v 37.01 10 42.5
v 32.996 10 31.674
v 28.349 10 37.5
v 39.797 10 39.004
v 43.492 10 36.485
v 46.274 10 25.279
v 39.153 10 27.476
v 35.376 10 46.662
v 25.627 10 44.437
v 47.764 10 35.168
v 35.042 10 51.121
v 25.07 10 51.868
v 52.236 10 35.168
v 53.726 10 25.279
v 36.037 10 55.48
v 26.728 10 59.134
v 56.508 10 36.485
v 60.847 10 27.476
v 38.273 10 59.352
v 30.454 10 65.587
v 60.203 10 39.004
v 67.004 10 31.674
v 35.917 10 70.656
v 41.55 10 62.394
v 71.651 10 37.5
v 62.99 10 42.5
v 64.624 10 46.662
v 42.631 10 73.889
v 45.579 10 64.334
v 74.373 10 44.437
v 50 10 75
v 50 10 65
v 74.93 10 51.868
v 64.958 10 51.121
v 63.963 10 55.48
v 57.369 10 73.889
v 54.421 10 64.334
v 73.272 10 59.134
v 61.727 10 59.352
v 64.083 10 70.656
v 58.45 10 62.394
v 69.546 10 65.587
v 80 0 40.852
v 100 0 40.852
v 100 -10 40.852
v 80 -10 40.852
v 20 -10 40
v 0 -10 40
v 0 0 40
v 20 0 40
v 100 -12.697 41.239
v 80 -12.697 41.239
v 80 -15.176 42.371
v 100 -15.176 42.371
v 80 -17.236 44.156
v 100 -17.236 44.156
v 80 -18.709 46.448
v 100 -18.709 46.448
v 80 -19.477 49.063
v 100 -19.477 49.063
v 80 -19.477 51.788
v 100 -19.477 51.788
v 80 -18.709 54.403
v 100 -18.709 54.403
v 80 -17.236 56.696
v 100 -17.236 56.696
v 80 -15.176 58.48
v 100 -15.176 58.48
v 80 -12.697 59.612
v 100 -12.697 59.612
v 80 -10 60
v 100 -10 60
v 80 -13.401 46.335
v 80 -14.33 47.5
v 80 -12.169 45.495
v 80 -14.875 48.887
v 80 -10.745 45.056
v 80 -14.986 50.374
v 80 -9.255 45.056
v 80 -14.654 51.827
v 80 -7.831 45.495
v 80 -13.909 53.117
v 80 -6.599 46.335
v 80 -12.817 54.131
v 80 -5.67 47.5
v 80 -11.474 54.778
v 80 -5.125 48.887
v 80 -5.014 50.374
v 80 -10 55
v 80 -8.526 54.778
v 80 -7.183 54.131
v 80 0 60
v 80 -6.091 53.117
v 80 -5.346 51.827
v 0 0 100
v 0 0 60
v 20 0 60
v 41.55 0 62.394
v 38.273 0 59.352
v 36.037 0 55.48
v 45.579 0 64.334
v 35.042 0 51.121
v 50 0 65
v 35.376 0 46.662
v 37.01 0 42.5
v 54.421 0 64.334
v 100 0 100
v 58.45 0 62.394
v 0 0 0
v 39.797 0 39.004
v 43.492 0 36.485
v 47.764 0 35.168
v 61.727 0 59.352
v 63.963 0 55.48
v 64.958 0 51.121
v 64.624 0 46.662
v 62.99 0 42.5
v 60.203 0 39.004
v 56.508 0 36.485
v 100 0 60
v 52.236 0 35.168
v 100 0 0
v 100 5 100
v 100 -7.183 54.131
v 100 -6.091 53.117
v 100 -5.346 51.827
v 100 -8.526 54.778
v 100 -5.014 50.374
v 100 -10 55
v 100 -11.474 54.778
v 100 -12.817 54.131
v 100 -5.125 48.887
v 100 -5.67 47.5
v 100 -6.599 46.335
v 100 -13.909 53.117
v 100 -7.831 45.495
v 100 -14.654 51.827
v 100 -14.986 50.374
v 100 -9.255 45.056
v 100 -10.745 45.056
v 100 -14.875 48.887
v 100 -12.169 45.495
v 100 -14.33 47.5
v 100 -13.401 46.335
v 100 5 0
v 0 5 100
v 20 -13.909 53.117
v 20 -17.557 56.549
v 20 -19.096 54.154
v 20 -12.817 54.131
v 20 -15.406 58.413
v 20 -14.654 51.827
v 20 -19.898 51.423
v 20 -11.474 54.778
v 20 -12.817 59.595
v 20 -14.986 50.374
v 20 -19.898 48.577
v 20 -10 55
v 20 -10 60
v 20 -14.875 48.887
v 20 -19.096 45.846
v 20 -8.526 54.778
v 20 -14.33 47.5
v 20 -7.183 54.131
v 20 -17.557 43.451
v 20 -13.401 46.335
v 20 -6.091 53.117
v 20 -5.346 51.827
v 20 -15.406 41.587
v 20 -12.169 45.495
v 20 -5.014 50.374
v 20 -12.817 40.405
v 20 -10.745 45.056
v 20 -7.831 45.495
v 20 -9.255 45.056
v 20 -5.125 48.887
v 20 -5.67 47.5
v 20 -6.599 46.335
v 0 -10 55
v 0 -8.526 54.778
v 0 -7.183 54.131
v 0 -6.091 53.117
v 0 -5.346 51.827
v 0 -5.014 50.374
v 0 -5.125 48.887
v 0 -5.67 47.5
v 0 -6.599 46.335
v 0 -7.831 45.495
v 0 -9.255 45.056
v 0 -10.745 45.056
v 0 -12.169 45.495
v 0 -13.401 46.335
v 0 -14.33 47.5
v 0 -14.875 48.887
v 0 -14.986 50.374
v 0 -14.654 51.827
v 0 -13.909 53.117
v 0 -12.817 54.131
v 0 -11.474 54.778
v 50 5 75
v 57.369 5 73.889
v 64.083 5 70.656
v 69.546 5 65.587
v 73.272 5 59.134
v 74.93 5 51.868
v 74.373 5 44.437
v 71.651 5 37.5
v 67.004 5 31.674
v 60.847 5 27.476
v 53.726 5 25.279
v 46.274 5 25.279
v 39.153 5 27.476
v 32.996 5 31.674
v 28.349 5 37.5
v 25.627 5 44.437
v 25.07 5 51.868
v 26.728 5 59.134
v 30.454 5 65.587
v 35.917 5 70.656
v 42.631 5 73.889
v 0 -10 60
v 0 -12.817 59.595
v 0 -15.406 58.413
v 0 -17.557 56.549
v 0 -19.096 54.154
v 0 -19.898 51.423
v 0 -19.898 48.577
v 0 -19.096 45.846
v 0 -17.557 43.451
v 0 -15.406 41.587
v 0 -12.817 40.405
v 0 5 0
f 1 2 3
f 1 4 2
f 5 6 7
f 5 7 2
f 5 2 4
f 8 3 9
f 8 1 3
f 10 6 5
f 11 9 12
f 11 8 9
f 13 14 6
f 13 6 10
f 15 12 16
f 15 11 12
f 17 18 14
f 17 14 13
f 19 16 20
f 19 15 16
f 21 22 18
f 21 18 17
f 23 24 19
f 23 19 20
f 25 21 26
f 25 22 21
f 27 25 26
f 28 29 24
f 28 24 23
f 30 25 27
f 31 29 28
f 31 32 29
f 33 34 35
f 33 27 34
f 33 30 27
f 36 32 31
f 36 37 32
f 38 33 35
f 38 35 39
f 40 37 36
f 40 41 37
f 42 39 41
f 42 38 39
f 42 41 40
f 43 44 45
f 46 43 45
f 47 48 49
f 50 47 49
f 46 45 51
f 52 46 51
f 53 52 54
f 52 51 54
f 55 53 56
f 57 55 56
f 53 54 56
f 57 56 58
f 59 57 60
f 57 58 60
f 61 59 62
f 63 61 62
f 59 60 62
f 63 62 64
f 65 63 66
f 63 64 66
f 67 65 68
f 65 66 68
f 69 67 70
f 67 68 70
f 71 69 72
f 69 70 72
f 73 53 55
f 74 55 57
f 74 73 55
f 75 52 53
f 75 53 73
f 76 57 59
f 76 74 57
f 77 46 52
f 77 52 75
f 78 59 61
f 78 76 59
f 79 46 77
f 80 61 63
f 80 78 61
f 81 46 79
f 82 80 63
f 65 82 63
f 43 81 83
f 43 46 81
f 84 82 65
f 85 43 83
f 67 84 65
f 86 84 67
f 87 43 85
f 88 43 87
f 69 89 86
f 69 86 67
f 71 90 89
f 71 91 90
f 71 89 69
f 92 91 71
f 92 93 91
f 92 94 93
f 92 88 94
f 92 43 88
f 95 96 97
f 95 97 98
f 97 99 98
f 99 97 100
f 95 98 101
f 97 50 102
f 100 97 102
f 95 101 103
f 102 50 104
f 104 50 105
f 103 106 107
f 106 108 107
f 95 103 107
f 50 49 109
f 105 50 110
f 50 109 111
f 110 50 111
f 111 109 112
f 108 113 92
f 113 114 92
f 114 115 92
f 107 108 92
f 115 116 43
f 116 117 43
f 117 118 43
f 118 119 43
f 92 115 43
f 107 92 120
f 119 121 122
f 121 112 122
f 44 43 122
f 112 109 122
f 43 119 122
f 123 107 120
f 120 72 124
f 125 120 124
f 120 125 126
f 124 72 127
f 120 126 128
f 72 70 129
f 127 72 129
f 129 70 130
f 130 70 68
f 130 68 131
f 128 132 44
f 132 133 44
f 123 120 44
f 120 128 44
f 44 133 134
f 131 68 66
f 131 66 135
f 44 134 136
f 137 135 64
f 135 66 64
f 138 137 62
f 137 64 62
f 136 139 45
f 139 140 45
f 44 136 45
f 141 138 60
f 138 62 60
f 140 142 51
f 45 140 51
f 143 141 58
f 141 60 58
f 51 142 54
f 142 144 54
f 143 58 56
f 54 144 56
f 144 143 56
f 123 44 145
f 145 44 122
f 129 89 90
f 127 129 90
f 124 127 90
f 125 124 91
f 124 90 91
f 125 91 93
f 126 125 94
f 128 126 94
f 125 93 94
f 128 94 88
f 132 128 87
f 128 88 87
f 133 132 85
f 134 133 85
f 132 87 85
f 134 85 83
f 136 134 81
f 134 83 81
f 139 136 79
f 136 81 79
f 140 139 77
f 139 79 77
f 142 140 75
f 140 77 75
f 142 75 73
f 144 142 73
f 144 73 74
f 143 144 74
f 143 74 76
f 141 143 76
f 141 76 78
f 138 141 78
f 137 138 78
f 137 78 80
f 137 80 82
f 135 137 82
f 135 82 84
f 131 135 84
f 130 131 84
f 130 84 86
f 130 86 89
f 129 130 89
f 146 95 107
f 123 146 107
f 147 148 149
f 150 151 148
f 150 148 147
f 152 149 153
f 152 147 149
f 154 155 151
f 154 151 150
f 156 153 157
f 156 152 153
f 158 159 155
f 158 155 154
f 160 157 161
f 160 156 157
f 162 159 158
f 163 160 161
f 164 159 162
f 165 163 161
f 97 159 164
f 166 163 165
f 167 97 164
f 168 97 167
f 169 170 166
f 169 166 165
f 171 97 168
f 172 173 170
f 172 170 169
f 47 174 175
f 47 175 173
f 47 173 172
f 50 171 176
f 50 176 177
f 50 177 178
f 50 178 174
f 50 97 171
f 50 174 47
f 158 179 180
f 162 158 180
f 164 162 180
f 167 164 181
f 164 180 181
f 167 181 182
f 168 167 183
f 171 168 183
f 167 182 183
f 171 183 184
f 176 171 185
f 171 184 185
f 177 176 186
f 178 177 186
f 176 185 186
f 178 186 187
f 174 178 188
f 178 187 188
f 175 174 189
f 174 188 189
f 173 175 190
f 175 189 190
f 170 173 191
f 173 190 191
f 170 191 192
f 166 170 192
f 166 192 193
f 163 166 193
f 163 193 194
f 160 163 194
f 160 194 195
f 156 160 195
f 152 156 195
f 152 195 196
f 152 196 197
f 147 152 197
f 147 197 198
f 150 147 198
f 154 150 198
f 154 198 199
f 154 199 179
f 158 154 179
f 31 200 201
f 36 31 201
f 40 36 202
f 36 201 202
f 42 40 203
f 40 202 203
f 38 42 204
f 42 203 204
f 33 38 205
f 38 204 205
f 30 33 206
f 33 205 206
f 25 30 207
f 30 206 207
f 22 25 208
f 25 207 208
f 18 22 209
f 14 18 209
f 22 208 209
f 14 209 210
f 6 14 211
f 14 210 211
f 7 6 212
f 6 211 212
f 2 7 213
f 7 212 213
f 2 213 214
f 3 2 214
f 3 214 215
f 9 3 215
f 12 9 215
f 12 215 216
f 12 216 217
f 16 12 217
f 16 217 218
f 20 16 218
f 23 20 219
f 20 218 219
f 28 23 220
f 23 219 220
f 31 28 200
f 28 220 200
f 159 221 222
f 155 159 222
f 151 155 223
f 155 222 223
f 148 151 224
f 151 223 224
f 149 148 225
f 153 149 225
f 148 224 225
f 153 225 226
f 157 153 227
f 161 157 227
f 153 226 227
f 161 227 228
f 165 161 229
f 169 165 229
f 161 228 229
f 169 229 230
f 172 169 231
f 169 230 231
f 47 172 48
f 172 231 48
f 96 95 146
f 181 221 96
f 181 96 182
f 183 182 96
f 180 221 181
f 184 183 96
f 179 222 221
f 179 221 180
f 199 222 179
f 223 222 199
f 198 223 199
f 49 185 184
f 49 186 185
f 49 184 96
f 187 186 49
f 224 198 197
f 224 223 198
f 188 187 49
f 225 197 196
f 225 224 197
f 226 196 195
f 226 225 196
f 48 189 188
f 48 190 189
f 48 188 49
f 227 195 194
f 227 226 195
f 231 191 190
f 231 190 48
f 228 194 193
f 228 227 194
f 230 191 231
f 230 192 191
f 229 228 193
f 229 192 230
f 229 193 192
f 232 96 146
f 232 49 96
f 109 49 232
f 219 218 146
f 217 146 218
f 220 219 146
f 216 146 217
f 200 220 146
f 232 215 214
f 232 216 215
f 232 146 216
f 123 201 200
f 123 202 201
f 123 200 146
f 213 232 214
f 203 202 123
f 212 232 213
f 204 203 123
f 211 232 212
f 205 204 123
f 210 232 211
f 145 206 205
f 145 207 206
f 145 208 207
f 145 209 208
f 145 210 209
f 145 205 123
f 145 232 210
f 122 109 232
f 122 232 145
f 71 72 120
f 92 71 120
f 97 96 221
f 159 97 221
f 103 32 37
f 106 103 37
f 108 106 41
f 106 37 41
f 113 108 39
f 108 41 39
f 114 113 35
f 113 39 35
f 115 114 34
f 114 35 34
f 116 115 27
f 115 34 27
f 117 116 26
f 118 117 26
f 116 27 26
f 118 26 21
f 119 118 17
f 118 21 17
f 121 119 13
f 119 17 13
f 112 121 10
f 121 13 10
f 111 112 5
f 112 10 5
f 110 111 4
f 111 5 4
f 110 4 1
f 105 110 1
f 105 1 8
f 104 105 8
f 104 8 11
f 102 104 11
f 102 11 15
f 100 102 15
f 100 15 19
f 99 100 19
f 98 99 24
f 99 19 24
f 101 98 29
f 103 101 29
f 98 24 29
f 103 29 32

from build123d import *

# Parameters (mm, degrees)
SKETCH_1_W          = 100
SKETCH_1_H          = 100
EXTRUDE_1_DEPTH     = 5
SKETCH_2_R          = 25
EXTRUDE_2_DEPTH     = 5
SKETCH_3_R          = 15
CUT_EXTRUDE_1_DEPTH = 10
EXTRUDE_3_DEPTH     = 20
EXTRUDE_4_DEPTH     = 20
SKETCH_6_R          = 5
CUT_EXTRUDE_2_DEPTH = 100


with BuildPart() as part:
    # 草图1 → 凸台-拉伸1 (new body)
    with BuildSketch(Plane(origin=(0, 0, 0), x_dir=(1, 0, 0), z_dir=(0, 1, 0))):
        with Locations((50, -50)):
            Rectangle(SKETCH_1_W, SKETCH_1_H)
    extrude(amount=EXTRUDE_1_DEPTH)

    # 草图2 → 凸台-拉伸2 (add)
    with BuildSketch(Plane(origin=(0, 5, 0), x_dir=(1, 0, 0), z_dir=(0, 1, 0))):
        with Locations(Location((50, -50, 0), (0, 0, 270))):
            Circle(SKETCH_2_R)
    extrude(amount=EXTRUDE_2_DEPTH)

    # 草图3 → 切除-拉伸1 (cut)
    with BuildSketch(Plane(origin=(0, 10, 0), x_dir=(1, 0, 0), z_dir=(0, 1, 0))):
        with Locations(Location((50, -50, 0), (0, 0, 270))):
            Circle(SKETCH_3_R)
    extrude(amount=-CUT_EXTRUDE_1_DEPTH, mode=Mode.SUBTRACT)

    # 草图4 → 凸台-拉伸3 (add)
    with BuildSketch(Plane(origin=(100, 0, 0), x_dir=(0, 0, -1), z_dir=(1, 0, 0))):
        with BuildLine():
            Line((-60, 0), (-40.851510599, 0))
            Line((-40.851510599, 0), (-40.851510599, -10))
            ThreePointArc((-40.851510599, -10), (-50.4257553, -19.5742447), (-60, -10))
            Line((-60, -10), (-60, 0))
        make_face()
    extrude(amount=-EXTRUDE_3_DEPTH)

    # 草图5 → 凸台-拉伸4 (add)
    with BuildSketch(Plane.ZY):
        with BuildLine():
            Line((40, 0), (60, 0))
            Line((60, 0), (60, -10))
            ThreePointArc((60, -10), (50, -20), (40, -10))
            Line((40, -10), (40, 0))
        make_face()
    extrude(amount=-EXTRUDE_4_DEPTH)

    # 草图6 → 切除-拉伸2 (cut)
    with BuildSketch(Plane.ZY):
        with Locations((50, -10)):
            Circle(SKETCH_6_R)
    extrude(amount=-CUT_EXTRUDE_2_DEPTH, mode=Mode.SUBTRACT)


solid = part.part
